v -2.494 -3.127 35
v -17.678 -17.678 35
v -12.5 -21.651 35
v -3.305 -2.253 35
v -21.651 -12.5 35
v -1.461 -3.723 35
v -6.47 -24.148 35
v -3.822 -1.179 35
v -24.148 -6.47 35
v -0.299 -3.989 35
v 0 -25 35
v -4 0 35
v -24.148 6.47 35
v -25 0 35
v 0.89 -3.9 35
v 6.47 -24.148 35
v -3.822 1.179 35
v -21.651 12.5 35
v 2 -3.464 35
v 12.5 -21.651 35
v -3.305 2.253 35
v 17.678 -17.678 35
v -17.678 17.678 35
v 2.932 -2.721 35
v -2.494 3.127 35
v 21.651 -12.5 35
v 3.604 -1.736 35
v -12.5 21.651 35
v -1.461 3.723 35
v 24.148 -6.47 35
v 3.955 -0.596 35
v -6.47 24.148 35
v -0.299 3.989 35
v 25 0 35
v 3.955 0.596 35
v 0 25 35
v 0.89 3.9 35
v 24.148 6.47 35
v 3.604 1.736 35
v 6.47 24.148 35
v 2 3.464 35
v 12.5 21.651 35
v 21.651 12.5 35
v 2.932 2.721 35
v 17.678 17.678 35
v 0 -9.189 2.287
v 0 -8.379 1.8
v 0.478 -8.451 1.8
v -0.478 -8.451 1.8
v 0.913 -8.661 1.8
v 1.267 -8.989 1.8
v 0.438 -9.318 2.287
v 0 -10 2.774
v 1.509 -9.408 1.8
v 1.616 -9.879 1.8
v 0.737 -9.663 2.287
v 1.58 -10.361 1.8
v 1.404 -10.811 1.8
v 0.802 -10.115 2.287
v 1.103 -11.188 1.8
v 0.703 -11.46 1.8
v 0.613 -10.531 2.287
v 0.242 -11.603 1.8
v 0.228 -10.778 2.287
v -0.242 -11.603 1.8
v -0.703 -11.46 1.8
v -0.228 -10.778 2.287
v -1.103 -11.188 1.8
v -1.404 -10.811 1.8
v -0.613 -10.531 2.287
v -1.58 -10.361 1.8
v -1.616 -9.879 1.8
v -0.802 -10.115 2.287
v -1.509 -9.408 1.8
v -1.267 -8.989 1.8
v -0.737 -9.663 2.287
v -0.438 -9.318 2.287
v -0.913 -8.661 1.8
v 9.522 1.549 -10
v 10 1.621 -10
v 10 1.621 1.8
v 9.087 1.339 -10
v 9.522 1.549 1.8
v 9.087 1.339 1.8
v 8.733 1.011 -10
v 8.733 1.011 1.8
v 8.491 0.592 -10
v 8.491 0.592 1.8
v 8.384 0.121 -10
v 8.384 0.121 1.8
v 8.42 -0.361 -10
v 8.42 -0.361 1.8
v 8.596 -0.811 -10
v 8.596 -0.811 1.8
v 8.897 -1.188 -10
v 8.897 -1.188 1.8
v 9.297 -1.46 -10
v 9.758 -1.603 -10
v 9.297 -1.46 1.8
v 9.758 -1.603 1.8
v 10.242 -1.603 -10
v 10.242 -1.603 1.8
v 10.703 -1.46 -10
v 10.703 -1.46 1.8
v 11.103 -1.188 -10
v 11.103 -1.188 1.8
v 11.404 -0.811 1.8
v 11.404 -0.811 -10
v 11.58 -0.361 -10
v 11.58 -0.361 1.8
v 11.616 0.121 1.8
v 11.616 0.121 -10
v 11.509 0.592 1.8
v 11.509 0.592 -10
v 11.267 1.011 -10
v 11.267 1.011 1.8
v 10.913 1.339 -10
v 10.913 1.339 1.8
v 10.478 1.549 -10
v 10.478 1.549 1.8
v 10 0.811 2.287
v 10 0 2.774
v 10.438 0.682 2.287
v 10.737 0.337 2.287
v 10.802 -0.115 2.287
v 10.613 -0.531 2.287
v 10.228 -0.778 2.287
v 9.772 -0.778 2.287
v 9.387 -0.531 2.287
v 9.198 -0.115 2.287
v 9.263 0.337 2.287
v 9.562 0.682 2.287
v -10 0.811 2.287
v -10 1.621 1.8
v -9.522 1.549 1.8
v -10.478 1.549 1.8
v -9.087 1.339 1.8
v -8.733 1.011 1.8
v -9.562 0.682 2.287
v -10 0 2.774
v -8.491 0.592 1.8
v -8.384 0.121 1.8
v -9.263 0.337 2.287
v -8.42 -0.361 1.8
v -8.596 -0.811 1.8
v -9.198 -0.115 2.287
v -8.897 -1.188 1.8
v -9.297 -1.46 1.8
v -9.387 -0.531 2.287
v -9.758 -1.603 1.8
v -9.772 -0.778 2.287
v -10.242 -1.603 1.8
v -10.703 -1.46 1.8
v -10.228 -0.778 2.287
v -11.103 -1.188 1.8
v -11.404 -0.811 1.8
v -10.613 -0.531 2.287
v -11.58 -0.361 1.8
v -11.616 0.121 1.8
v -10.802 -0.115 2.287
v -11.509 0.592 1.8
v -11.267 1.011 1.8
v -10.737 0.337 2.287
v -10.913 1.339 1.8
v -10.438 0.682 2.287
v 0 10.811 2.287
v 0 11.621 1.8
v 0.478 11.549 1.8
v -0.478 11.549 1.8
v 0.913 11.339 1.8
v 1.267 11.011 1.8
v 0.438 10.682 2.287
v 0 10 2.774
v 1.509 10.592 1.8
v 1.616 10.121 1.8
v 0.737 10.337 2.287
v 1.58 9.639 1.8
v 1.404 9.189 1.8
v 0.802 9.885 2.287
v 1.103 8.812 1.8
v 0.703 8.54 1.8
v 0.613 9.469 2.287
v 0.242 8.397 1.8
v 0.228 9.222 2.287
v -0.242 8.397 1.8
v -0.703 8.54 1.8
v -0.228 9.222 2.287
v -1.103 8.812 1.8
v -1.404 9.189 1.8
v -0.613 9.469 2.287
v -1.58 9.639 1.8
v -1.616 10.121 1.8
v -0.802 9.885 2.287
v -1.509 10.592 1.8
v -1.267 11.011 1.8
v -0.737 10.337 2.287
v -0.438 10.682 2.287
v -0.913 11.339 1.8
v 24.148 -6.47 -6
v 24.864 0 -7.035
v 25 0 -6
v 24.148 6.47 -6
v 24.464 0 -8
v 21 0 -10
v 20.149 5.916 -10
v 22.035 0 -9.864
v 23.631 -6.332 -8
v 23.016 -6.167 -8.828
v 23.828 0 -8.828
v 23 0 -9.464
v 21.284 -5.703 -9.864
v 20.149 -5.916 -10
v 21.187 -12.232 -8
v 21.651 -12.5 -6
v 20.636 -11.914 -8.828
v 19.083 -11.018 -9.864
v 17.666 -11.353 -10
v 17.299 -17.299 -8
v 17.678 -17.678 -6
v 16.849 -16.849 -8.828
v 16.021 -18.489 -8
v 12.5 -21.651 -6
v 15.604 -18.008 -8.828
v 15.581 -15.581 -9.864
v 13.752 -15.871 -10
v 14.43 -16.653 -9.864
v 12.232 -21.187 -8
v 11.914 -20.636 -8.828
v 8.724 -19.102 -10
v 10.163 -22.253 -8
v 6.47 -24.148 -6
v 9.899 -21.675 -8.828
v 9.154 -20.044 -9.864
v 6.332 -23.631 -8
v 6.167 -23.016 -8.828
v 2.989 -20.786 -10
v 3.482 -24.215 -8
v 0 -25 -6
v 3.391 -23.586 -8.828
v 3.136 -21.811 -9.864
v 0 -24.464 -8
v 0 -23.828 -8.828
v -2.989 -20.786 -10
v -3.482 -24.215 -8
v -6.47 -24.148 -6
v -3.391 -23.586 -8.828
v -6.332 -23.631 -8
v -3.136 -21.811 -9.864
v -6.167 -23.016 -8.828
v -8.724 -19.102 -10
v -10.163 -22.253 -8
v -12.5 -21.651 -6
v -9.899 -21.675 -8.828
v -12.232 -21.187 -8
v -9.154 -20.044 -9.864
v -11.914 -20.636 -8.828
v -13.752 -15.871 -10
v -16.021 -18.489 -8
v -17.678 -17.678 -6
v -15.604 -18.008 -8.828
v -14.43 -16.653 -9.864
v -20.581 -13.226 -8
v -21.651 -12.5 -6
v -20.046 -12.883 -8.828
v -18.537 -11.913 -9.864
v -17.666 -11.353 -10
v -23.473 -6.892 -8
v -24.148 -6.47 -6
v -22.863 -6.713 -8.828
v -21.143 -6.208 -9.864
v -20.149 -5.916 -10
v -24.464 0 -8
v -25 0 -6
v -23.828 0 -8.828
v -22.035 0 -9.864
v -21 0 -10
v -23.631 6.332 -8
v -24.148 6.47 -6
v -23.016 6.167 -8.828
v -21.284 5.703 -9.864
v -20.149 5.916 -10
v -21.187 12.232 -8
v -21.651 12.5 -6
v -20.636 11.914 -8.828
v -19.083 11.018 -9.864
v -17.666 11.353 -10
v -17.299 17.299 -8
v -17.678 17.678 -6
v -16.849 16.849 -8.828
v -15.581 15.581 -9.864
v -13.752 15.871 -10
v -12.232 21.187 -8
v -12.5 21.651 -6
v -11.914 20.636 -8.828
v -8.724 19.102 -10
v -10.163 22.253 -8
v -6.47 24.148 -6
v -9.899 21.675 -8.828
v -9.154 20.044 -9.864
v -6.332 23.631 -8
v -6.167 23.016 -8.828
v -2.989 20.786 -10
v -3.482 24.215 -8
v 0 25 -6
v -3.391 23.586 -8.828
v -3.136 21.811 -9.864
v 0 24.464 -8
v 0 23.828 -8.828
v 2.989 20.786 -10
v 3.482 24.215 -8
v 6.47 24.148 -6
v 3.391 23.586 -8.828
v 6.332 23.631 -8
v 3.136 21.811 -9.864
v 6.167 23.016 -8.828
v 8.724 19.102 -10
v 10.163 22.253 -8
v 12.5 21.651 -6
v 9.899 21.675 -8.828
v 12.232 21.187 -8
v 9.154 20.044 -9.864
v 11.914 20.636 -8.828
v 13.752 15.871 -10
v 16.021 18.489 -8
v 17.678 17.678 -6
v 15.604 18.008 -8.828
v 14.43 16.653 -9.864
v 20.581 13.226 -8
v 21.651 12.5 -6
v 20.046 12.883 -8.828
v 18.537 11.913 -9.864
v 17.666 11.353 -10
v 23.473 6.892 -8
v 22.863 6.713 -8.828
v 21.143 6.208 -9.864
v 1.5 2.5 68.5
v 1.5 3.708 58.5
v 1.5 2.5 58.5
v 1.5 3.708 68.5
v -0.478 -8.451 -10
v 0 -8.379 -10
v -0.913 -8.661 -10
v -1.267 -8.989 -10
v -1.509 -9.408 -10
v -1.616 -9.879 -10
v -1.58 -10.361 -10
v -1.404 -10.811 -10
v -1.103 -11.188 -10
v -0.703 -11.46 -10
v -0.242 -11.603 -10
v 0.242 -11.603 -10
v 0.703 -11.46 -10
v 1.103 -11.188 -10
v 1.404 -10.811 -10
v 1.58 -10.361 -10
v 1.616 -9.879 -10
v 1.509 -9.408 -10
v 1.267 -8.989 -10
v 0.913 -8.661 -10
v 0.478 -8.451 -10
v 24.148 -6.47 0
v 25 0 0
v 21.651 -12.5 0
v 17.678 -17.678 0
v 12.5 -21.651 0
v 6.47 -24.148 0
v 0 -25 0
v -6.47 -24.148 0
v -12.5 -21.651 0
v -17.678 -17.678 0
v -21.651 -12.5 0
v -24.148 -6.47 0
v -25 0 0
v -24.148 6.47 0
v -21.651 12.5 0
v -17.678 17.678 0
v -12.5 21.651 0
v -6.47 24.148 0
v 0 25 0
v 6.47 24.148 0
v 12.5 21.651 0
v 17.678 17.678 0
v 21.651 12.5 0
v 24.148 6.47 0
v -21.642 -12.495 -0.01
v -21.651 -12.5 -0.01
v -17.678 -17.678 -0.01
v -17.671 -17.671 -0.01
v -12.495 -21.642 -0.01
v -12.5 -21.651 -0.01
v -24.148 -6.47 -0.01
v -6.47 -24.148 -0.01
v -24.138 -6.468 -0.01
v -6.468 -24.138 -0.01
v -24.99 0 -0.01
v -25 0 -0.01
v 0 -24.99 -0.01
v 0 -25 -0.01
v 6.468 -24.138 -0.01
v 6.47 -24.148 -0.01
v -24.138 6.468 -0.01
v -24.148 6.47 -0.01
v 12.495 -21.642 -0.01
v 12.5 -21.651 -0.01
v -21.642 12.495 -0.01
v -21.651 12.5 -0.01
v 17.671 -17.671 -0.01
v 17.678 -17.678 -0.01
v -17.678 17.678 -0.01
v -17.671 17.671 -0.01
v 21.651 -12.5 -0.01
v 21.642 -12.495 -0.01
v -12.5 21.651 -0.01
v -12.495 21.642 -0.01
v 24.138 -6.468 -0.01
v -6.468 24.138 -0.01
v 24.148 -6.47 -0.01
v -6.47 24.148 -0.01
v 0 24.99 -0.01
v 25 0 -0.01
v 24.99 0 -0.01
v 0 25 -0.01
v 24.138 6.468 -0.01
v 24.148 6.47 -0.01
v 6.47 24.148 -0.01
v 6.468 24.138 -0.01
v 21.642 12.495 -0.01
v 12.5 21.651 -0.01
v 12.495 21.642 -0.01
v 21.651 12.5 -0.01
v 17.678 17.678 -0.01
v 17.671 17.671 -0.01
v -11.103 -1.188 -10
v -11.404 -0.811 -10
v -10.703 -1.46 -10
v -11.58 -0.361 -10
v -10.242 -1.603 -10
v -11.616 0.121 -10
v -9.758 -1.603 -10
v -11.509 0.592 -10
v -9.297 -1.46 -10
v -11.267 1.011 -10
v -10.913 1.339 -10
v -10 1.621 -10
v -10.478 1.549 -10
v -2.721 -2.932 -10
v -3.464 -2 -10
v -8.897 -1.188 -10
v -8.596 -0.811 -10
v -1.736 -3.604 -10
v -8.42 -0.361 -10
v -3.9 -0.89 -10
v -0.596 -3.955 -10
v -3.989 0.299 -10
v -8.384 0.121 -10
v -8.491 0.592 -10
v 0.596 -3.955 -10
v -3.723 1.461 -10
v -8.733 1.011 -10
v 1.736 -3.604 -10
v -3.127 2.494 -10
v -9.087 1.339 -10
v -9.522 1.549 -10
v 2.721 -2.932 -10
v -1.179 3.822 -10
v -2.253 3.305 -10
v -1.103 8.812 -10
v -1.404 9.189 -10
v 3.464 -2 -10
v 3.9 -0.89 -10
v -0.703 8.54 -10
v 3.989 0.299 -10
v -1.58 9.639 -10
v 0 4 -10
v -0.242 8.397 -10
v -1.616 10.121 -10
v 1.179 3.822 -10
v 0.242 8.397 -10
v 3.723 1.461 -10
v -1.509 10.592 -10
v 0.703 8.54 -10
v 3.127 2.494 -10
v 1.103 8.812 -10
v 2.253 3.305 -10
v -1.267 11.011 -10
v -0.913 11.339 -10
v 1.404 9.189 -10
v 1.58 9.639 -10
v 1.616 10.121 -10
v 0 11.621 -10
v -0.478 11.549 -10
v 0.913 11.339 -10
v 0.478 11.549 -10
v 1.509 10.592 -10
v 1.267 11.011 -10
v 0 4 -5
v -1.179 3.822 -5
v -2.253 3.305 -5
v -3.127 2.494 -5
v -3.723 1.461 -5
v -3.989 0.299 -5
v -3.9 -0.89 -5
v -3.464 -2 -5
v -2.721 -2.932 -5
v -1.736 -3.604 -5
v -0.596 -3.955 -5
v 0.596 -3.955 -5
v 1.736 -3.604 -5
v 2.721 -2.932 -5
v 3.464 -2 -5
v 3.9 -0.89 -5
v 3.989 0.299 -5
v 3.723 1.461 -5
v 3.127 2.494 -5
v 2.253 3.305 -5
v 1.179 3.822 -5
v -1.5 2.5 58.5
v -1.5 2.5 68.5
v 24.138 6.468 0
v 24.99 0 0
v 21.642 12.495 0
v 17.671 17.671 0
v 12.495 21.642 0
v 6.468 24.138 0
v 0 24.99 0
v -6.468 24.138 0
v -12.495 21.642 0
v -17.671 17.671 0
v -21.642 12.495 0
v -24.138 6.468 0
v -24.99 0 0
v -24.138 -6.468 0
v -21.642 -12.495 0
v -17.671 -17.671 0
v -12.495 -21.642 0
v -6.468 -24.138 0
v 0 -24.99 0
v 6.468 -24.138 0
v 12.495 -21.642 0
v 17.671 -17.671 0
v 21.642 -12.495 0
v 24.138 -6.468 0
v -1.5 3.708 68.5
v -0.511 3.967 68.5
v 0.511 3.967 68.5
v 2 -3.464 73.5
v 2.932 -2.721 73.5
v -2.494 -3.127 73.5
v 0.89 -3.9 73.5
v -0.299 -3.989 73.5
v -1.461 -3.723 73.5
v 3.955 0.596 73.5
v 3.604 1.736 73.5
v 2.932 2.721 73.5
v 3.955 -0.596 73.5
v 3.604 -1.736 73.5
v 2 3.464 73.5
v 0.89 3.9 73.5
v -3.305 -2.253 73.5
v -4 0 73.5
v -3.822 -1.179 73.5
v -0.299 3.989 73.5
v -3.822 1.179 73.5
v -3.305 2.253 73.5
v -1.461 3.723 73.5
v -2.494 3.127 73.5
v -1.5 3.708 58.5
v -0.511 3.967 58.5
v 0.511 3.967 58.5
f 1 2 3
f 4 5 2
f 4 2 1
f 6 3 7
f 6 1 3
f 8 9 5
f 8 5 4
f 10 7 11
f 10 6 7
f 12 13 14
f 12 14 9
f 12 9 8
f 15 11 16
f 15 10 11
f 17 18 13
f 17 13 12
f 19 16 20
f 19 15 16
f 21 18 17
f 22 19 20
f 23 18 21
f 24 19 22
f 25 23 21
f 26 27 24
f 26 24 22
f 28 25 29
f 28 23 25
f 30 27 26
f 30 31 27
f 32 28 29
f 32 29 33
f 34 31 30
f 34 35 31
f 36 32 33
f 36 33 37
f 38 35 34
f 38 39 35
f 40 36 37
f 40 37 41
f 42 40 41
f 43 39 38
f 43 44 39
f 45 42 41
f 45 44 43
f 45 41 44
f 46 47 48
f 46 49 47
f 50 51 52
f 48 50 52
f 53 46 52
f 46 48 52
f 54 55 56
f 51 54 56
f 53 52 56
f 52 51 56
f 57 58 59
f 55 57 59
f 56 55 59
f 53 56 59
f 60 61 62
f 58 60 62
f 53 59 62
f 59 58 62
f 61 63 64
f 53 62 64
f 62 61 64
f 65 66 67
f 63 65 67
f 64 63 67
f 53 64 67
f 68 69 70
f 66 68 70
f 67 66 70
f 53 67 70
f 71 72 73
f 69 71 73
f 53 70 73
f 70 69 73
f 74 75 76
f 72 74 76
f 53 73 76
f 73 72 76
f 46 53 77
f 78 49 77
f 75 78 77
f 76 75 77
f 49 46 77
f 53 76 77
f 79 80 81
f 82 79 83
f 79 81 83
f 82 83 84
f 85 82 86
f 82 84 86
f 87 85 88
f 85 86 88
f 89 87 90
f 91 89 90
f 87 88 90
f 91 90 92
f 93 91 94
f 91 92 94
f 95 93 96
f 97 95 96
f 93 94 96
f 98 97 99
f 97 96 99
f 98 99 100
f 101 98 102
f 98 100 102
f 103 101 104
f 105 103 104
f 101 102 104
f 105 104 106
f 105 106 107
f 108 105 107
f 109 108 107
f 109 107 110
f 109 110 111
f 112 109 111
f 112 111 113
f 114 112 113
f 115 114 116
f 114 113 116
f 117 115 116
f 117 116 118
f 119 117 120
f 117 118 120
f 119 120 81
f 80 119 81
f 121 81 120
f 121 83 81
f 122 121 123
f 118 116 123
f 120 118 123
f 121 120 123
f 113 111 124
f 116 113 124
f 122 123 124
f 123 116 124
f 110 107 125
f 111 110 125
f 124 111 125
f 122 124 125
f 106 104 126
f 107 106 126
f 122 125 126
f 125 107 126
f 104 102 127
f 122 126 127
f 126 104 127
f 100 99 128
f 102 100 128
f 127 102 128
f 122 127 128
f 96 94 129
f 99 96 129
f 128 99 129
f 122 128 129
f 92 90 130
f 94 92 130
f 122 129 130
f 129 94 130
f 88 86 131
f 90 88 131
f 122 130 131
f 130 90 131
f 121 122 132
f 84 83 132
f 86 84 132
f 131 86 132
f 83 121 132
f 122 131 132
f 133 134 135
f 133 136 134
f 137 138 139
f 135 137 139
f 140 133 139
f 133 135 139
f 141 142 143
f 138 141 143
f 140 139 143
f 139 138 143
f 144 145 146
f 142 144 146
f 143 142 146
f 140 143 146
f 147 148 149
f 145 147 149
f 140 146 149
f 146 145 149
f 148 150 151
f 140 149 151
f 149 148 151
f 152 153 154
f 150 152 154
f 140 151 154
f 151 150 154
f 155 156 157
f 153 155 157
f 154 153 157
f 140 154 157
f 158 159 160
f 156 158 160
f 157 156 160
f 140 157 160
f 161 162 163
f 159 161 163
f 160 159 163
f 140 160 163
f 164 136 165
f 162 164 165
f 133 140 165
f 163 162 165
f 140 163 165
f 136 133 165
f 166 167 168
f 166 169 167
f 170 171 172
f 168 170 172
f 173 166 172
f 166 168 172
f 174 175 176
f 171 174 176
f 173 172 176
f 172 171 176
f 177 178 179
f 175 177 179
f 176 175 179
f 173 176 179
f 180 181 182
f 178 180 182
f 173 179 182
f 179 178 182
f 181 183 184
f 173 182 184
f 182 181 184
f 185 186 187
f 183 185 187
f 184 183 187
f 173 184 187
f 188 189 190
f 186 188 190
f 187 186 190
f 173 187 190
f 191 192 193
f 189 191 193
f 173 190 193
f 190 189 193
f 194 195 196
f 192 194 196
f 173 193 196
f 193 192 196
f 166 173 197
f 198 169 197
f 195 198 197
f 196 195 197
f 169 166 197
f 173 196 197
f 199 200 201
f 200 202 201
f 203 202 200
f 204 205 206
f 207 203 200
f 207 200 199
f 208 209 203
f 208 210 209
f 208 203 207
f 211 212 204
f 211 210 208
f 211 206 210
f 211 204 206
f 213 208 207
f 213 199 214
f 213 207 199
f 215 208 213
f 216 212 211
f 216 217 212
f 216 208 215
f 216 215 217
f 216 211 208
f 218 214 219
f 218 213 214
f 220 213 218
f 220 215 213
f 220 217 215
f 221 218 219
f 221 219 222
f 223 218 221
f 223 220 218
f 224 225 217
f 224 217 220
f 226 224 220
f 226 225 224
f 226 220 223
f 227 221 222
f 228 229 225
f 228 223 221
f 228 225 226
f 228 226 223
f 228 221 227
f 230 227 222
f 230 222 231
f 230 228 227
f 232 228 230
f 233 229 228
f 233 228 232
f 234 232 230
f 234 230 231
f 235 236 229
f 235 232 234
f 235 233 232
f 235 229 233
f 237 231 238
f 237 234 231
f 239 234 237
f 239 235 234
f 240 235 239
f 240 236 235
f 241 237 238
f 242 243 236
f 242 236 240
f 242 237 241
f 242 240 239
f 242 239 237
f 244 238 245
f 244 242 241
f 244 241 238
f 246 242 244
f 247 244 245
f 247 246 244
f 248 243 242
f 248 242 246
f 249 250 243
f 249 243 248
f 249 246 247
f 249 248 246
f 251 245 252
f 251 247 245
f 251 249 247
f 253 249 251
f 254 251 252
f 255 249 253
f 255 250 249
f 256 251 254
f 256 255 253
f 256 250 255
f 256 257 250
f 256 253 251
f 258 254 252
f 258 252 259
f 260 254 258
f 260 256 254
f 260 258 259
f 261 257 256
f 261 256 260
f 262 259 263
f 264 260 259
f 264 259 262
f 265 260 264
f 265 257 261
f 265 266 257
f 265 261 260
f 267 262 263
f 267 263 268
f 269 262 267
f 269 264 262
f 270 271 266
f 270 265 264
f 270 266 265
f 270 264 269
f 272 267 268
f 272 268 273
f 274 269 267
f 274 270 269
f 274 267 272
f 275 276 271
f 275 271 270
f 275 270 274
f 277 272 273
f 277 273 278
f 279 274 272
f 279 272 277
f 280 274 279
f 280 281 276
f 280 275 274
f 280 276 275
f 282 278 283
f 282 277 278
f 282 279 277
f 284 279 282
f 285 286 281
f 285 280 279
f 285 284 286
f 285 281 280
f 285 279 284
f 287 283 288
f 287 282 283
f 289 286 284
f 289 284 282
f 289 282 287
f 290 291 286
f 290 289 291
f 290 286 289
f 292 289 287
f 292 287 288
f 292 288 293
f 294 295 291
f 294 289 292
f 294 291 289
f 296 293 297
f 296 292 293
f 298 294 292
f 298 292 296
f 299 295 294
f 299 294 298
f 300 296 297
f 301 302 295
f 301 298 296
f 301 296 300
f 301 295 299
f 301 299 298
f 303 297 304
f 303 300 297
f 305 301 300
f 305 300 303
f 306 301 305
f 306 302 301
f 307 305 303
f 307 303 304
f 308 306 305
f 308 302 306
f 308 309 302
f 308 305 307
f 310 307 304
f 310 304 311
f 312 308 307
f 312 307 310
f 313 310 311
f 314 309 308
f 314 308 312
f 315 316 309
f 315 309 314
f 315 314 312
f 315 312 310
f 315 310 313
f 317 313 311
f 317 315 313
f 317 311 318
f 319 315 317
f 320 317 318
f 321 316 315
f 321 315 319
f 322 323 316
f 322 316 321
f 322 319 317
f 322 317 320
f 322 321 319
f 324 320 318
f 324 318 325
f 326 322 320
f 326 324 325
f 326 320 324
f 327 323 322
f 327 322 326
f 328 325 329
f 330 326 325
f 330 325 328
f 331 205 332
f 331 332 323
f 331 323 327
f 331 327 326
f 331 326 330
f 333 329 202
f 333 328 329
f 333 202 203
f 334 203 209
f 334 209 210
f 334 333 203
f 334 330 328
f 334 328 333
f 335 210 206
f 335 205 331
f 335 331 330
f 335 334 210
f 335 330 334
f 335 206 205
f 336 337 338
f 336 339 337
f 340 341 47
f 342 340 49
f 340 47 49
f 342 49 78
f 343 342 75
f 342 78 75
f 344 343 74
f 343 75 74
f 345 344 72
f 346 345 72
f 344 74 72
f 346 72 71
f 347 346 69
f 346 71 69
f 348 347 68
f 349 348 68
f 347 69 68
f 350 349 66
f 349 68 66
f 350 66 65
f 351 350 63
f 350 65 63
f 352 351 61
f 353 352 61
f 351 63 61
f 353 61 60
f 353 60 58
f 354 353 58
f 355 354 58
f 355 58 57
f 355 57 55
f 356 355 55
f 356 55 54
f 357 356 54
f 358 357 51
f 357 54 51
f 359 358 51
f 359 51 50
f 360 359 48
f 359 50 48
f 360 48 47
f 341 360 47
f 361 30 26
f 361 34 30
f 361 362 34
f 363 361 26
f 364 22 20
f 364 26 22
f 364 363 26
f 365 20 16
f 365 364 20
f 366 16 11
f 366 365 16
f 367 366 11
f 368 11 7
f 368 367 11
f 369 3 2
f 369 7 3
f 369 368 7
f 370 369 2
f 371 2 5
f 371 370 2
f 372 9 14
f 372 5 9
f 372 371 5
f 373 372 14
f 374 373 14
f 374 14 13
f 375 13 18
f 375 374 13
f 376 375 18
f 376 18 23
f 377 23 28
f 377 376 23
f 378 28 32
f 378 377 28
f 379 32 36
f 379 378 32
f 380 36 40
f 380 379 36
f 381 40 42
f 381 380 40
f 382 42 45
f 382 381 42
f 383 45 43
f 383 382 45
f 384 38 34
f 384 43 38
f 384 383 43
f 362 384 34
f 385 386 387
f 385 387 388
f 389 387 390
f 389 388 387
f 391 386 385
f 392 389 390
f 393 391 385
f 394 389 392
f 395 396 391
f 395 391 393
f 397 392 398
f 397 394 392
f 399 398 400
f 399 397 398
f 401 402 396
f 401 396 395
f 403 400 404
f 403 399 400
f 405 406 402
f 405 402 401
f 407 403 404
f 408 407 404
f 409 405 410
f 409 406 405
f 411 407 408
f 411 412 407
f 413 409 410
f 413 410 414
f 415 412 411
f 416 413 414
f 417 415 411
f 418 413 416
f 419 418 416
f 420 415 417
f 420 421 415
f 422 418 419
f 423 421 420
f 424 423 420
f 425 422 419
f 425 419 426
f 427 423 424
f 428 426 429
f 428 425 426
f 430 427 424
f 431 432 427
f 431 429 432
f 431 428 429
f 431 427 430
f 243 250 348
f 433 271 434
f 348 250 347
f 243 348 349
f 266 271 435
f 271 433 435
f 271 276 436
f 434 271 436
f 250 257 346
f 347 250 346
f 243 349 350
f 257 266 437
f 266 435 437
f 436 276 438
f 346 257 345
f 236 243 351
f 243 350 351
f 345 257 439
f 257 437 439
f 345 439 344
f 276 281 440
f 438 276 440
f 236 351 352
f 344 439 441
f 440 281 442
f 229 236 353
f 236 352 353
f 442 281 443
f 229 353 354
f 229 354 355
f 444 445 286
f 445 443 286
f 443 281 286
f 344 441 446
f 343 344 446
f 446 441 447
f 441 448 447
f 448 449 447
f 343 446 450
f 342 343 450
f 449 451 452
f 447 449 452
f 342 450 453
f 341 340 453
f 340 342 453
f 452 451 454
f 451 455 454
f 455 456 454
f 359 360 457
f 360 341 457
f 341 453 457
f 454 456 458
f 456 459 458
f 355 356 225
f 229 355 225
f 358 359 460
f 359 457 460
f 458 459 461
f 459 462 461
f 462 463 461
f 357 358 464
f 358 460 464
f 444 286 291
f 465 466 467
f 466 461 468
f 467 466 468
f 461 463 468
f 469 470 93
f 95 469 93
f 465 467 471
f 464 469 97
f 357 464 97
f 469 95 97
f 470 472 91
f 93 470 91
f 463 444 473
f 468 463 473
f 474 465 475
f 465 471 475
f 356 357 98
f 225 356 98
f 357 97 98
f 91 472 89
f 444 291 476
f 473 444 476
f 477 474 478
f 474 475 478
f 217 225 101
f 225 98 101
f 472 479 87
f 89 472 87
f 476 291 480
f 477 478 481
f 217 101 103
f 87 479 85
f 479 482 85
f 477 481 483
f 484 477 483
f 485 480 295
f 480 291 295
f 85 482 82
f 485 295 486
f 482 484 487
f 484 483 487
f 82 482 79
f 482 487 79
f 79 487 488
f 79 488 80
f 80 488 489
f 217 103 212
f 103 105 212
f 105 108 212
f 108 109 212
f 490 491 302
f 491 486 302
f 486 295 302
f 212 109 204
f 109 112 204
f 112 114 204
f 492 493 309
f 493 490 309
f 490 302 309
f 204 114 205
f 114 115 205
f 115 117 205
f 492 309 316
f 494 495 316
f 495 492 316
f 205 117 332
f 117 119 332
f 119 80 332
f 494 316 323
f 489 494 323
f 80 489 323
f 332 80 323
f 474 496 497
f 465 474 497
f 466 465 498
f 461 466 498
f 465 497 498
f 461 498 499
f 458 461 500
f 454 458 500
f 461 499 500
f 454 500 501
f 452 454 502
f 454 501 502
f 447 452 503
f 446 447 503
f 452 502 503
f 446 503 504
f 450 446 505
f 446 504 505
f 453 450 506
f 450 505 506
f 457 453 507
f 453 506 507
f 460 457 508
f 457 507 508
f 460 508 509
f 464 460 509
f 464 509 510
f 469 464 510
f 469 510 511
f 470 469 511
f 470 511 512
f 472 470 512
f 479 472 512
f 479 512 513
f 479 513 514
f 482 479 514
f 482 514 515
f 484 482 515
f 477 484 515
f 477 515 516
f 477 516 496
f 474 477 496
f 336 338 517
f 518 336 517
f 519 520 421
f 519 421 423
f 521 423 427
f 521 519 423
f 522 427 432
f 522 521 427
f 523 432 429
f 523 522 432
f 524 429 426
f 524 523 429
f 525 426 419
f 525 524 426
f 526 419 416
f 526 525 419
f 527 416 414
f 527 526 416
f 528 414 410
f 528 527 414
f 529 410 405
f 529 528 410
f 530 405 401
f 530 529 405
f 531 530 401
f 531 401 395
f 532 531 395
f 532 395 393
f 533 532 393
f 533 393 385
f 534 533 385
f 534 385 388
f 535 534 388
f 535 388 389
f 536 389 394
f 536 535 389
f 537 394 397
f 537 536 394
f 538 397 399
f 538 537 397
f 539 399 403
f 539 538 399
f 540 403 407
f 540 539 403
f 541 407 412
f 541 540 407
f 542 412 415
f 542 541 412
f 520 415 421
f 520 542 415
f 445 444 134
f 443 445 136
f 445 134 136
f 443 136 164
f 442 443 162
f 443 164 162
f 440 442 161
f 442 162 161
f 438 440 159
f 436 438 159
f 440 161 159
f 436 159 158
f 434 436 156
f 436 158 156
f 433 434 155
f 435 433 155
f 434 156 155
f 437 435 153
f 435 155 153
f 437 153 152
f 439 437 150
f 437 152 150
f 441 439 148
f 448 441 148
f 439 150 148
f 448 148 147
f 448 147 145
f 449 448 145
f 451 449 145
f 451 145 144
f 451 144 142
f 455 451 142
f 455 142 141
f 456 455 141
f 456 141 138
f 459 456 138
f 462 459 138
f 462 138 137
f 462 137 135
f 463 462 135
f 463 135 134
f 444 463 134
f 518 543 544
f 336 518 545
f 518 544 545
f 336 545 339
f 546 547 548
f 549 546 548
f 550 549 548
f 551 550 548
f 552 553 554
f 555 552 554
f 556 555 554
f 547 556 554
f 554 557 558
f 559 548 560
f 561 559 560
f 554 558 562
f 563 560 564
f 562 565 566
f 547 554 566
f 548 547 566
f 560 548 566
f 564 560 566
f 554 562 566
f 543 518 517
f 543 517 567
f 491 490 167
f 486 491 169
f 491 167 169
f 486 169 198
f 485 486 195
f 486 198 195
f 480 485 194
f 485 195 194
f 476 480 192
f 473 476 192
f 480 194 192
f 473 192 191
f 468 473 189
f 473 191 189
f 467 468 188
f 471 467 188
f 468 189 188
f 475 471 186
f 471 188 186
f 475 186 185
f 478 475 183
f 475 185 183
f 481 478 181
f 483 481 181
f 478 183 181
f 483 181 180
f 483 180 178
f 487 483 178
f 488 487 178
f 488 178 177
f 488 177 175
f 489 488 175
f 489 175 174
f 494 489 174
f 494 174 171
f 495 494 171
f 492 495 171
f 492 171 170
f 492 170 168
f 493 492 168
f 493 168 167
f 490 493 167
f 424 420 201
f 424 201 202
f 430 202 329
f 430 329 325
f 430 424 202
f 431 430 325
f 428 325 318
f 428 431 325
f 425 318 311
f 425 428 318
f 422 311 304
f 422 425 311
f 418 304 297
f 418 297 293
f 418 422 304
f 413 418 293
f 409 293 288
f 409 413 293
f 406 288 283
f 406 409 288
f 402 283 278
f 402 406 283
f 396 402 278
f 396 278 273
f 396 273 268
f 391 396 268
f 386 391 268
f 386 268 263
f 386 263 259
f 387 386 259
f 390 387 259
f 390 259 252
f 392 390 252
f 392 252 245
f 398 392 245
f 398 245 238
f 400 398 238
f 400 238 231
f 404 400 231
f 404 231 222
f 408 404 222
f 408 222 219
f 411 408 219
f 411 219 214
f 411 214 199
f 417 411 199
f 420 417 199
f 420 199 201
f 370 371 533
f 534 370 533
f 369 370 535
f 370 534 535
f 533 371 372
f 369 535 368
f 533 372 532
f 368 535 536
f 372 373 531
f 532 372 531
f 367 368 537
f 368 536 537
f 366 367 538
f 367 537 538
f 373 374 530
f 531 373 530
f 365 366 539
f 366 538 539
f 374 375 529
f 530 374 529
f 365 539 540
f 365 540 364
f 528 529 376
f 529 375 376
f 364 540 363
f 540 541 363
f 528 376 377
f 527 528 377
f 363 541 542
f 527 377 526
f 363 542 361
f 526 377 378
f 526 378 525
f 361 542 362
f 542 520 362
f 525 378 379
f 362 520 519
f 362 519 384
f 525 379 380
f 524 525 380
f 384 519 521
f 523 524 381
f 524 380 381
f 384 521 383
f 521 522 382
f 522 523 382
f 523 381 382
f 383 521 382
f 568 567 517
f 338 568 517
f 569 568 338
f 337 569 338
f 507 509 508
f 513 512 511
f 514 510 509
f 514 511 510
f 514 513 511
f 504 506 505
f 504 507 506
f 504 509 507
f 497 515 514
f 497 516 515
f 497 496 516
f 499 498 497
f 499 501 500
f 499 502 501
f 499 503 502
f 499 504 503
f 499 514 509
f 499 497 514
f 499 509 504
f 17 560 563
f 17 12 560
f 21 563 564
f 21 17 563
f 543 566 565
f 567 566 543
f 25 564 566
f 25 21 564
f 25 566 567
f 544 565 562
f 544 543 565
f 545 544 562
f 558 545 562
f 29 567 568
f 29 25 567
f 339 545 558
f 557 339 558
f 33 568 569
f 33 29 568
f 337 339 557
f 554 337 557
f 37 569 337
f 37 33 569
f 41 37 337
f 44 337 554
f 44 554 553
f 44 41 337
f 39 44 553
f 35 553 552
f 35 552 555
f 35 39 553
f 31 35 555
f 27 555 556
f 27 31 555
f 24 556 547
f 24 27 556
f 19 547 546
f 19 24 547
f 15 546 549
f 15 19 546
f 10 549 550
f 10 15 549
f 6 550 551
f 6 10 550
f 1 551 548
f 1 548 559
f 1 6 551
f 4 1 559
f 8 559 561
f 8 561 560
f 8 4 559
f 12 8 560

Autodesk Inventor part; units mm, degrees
ref_plane "YZ Plane" through (0, 0, 0) normal (1, 0, 0) x (0, 1, 0)
sketch "スケッチ1" plane through (0, 0, 0) normal (0, 0, 1) x (1, 0, 0)
  circle A0 centre (0, 0) radius 25
  dimension "d0" = 50
extrude "押し出し1" add sketch "スケッチ1" against normal blind 10
fillet "フィレット1" radius 4 1 edges at (-25, 0, -10)
sketch "スケッチ2" plane through (0, 0, 0) normal (0, 0, 1) x (1, 0, 0)
  circle A0 centre (0, 0) radius 25
  circle A1 centre (0, 0) radius 25 projected
extrude "押し出し2" add sketch "スケッチ2" along normal blind 35
sketch "スケッチ3" plane through (0, 0, 0) normal (0, 0, 1) x (1, 0, 0)
  circle A0 centre (0, 0) radius 25
  circle A1 centre (0, 0) radius 25 projected
  circle A2 centre (0, 0) radius 24.99
  dimension "d6" = 0.01
extrude "押し出し3" cut sketch "スケッチ3" against normal blind 0.01
sketch "スケッチ4" plane through (0, 0, -10) normal (0, 0, -1) x (-1, 0, 0)
  point P0 (0, 0)
  point P1 (0, 0)
hole "穴1" at (0, 0, -10) direction (0, 0, 1) diameter 8 end through all
sketch "スケッチ5" plane through (0, 0, -10) normal (0, 0, -1) x (-1, 0, 0)
  point P0 (0, 0)
  point P1 (0, -10)
  point P2 (10, 0)
  point P3 (0, 10)
  point P4 (-10, 0)
  dimension "d18" = 360
  dimension "d20" = 20
hole "穴2" at (0, -10, -10) at (-10, 0, -10) at (0, 10, -10) at (10, 0, -10) direction (0, 0, 1) diameter 3.242 depth 11.8 tip angle 118 thread size "M4x0.7" class "6H" standard "ISO Metric profile"
ref_plane "作業平面1" through (0, 0, -5) normal (0, 0, -1) x (-1, 0, 0)
sketch "スケッチ6" plane through (0, 0, -5) normal (0, 0, -1) x (-1, 0, 0)
  circle A0 centre (0, 0) radius 4 projected
  circle A1 centre (0, 0) radius 4
  dimension "d29" = 8
extrude "押し出し4" add sketch "スケッチ6" against normal blind 78.5
ref_plane "作業平面2" through (0, 0, 68.5) normal (0, 0, 1) x (1, 0, 0)
sketch "スケッチ7" plane through (0, 0, 68.5) normal (0, 0, 1) x (1, 0, 0)
  line L0 (-1.5, 4) -> (1.5, 4)
  line L1 (1.5, 4) -> (1.5, 2.5)
  line L2 (1.5, 2.5) -> (-1.5, 2.5)
  line L3 (-1.5, 2.5) -> (-1.5, 4)
  circle A0 centre (0, 0) radius 4 projected
  point P0 (0, 2.5)
  dimension "d33" = 3
  dimension "d34" = 1.5
extrude "押し出し5" cut sketch "スケッチ7" against normal blind 10 contours L0 A0 L3 | L0 L1 A0 | A0 L1 L2 L3 picked at (0, 3)
properties part number "Rotator_N5065"
